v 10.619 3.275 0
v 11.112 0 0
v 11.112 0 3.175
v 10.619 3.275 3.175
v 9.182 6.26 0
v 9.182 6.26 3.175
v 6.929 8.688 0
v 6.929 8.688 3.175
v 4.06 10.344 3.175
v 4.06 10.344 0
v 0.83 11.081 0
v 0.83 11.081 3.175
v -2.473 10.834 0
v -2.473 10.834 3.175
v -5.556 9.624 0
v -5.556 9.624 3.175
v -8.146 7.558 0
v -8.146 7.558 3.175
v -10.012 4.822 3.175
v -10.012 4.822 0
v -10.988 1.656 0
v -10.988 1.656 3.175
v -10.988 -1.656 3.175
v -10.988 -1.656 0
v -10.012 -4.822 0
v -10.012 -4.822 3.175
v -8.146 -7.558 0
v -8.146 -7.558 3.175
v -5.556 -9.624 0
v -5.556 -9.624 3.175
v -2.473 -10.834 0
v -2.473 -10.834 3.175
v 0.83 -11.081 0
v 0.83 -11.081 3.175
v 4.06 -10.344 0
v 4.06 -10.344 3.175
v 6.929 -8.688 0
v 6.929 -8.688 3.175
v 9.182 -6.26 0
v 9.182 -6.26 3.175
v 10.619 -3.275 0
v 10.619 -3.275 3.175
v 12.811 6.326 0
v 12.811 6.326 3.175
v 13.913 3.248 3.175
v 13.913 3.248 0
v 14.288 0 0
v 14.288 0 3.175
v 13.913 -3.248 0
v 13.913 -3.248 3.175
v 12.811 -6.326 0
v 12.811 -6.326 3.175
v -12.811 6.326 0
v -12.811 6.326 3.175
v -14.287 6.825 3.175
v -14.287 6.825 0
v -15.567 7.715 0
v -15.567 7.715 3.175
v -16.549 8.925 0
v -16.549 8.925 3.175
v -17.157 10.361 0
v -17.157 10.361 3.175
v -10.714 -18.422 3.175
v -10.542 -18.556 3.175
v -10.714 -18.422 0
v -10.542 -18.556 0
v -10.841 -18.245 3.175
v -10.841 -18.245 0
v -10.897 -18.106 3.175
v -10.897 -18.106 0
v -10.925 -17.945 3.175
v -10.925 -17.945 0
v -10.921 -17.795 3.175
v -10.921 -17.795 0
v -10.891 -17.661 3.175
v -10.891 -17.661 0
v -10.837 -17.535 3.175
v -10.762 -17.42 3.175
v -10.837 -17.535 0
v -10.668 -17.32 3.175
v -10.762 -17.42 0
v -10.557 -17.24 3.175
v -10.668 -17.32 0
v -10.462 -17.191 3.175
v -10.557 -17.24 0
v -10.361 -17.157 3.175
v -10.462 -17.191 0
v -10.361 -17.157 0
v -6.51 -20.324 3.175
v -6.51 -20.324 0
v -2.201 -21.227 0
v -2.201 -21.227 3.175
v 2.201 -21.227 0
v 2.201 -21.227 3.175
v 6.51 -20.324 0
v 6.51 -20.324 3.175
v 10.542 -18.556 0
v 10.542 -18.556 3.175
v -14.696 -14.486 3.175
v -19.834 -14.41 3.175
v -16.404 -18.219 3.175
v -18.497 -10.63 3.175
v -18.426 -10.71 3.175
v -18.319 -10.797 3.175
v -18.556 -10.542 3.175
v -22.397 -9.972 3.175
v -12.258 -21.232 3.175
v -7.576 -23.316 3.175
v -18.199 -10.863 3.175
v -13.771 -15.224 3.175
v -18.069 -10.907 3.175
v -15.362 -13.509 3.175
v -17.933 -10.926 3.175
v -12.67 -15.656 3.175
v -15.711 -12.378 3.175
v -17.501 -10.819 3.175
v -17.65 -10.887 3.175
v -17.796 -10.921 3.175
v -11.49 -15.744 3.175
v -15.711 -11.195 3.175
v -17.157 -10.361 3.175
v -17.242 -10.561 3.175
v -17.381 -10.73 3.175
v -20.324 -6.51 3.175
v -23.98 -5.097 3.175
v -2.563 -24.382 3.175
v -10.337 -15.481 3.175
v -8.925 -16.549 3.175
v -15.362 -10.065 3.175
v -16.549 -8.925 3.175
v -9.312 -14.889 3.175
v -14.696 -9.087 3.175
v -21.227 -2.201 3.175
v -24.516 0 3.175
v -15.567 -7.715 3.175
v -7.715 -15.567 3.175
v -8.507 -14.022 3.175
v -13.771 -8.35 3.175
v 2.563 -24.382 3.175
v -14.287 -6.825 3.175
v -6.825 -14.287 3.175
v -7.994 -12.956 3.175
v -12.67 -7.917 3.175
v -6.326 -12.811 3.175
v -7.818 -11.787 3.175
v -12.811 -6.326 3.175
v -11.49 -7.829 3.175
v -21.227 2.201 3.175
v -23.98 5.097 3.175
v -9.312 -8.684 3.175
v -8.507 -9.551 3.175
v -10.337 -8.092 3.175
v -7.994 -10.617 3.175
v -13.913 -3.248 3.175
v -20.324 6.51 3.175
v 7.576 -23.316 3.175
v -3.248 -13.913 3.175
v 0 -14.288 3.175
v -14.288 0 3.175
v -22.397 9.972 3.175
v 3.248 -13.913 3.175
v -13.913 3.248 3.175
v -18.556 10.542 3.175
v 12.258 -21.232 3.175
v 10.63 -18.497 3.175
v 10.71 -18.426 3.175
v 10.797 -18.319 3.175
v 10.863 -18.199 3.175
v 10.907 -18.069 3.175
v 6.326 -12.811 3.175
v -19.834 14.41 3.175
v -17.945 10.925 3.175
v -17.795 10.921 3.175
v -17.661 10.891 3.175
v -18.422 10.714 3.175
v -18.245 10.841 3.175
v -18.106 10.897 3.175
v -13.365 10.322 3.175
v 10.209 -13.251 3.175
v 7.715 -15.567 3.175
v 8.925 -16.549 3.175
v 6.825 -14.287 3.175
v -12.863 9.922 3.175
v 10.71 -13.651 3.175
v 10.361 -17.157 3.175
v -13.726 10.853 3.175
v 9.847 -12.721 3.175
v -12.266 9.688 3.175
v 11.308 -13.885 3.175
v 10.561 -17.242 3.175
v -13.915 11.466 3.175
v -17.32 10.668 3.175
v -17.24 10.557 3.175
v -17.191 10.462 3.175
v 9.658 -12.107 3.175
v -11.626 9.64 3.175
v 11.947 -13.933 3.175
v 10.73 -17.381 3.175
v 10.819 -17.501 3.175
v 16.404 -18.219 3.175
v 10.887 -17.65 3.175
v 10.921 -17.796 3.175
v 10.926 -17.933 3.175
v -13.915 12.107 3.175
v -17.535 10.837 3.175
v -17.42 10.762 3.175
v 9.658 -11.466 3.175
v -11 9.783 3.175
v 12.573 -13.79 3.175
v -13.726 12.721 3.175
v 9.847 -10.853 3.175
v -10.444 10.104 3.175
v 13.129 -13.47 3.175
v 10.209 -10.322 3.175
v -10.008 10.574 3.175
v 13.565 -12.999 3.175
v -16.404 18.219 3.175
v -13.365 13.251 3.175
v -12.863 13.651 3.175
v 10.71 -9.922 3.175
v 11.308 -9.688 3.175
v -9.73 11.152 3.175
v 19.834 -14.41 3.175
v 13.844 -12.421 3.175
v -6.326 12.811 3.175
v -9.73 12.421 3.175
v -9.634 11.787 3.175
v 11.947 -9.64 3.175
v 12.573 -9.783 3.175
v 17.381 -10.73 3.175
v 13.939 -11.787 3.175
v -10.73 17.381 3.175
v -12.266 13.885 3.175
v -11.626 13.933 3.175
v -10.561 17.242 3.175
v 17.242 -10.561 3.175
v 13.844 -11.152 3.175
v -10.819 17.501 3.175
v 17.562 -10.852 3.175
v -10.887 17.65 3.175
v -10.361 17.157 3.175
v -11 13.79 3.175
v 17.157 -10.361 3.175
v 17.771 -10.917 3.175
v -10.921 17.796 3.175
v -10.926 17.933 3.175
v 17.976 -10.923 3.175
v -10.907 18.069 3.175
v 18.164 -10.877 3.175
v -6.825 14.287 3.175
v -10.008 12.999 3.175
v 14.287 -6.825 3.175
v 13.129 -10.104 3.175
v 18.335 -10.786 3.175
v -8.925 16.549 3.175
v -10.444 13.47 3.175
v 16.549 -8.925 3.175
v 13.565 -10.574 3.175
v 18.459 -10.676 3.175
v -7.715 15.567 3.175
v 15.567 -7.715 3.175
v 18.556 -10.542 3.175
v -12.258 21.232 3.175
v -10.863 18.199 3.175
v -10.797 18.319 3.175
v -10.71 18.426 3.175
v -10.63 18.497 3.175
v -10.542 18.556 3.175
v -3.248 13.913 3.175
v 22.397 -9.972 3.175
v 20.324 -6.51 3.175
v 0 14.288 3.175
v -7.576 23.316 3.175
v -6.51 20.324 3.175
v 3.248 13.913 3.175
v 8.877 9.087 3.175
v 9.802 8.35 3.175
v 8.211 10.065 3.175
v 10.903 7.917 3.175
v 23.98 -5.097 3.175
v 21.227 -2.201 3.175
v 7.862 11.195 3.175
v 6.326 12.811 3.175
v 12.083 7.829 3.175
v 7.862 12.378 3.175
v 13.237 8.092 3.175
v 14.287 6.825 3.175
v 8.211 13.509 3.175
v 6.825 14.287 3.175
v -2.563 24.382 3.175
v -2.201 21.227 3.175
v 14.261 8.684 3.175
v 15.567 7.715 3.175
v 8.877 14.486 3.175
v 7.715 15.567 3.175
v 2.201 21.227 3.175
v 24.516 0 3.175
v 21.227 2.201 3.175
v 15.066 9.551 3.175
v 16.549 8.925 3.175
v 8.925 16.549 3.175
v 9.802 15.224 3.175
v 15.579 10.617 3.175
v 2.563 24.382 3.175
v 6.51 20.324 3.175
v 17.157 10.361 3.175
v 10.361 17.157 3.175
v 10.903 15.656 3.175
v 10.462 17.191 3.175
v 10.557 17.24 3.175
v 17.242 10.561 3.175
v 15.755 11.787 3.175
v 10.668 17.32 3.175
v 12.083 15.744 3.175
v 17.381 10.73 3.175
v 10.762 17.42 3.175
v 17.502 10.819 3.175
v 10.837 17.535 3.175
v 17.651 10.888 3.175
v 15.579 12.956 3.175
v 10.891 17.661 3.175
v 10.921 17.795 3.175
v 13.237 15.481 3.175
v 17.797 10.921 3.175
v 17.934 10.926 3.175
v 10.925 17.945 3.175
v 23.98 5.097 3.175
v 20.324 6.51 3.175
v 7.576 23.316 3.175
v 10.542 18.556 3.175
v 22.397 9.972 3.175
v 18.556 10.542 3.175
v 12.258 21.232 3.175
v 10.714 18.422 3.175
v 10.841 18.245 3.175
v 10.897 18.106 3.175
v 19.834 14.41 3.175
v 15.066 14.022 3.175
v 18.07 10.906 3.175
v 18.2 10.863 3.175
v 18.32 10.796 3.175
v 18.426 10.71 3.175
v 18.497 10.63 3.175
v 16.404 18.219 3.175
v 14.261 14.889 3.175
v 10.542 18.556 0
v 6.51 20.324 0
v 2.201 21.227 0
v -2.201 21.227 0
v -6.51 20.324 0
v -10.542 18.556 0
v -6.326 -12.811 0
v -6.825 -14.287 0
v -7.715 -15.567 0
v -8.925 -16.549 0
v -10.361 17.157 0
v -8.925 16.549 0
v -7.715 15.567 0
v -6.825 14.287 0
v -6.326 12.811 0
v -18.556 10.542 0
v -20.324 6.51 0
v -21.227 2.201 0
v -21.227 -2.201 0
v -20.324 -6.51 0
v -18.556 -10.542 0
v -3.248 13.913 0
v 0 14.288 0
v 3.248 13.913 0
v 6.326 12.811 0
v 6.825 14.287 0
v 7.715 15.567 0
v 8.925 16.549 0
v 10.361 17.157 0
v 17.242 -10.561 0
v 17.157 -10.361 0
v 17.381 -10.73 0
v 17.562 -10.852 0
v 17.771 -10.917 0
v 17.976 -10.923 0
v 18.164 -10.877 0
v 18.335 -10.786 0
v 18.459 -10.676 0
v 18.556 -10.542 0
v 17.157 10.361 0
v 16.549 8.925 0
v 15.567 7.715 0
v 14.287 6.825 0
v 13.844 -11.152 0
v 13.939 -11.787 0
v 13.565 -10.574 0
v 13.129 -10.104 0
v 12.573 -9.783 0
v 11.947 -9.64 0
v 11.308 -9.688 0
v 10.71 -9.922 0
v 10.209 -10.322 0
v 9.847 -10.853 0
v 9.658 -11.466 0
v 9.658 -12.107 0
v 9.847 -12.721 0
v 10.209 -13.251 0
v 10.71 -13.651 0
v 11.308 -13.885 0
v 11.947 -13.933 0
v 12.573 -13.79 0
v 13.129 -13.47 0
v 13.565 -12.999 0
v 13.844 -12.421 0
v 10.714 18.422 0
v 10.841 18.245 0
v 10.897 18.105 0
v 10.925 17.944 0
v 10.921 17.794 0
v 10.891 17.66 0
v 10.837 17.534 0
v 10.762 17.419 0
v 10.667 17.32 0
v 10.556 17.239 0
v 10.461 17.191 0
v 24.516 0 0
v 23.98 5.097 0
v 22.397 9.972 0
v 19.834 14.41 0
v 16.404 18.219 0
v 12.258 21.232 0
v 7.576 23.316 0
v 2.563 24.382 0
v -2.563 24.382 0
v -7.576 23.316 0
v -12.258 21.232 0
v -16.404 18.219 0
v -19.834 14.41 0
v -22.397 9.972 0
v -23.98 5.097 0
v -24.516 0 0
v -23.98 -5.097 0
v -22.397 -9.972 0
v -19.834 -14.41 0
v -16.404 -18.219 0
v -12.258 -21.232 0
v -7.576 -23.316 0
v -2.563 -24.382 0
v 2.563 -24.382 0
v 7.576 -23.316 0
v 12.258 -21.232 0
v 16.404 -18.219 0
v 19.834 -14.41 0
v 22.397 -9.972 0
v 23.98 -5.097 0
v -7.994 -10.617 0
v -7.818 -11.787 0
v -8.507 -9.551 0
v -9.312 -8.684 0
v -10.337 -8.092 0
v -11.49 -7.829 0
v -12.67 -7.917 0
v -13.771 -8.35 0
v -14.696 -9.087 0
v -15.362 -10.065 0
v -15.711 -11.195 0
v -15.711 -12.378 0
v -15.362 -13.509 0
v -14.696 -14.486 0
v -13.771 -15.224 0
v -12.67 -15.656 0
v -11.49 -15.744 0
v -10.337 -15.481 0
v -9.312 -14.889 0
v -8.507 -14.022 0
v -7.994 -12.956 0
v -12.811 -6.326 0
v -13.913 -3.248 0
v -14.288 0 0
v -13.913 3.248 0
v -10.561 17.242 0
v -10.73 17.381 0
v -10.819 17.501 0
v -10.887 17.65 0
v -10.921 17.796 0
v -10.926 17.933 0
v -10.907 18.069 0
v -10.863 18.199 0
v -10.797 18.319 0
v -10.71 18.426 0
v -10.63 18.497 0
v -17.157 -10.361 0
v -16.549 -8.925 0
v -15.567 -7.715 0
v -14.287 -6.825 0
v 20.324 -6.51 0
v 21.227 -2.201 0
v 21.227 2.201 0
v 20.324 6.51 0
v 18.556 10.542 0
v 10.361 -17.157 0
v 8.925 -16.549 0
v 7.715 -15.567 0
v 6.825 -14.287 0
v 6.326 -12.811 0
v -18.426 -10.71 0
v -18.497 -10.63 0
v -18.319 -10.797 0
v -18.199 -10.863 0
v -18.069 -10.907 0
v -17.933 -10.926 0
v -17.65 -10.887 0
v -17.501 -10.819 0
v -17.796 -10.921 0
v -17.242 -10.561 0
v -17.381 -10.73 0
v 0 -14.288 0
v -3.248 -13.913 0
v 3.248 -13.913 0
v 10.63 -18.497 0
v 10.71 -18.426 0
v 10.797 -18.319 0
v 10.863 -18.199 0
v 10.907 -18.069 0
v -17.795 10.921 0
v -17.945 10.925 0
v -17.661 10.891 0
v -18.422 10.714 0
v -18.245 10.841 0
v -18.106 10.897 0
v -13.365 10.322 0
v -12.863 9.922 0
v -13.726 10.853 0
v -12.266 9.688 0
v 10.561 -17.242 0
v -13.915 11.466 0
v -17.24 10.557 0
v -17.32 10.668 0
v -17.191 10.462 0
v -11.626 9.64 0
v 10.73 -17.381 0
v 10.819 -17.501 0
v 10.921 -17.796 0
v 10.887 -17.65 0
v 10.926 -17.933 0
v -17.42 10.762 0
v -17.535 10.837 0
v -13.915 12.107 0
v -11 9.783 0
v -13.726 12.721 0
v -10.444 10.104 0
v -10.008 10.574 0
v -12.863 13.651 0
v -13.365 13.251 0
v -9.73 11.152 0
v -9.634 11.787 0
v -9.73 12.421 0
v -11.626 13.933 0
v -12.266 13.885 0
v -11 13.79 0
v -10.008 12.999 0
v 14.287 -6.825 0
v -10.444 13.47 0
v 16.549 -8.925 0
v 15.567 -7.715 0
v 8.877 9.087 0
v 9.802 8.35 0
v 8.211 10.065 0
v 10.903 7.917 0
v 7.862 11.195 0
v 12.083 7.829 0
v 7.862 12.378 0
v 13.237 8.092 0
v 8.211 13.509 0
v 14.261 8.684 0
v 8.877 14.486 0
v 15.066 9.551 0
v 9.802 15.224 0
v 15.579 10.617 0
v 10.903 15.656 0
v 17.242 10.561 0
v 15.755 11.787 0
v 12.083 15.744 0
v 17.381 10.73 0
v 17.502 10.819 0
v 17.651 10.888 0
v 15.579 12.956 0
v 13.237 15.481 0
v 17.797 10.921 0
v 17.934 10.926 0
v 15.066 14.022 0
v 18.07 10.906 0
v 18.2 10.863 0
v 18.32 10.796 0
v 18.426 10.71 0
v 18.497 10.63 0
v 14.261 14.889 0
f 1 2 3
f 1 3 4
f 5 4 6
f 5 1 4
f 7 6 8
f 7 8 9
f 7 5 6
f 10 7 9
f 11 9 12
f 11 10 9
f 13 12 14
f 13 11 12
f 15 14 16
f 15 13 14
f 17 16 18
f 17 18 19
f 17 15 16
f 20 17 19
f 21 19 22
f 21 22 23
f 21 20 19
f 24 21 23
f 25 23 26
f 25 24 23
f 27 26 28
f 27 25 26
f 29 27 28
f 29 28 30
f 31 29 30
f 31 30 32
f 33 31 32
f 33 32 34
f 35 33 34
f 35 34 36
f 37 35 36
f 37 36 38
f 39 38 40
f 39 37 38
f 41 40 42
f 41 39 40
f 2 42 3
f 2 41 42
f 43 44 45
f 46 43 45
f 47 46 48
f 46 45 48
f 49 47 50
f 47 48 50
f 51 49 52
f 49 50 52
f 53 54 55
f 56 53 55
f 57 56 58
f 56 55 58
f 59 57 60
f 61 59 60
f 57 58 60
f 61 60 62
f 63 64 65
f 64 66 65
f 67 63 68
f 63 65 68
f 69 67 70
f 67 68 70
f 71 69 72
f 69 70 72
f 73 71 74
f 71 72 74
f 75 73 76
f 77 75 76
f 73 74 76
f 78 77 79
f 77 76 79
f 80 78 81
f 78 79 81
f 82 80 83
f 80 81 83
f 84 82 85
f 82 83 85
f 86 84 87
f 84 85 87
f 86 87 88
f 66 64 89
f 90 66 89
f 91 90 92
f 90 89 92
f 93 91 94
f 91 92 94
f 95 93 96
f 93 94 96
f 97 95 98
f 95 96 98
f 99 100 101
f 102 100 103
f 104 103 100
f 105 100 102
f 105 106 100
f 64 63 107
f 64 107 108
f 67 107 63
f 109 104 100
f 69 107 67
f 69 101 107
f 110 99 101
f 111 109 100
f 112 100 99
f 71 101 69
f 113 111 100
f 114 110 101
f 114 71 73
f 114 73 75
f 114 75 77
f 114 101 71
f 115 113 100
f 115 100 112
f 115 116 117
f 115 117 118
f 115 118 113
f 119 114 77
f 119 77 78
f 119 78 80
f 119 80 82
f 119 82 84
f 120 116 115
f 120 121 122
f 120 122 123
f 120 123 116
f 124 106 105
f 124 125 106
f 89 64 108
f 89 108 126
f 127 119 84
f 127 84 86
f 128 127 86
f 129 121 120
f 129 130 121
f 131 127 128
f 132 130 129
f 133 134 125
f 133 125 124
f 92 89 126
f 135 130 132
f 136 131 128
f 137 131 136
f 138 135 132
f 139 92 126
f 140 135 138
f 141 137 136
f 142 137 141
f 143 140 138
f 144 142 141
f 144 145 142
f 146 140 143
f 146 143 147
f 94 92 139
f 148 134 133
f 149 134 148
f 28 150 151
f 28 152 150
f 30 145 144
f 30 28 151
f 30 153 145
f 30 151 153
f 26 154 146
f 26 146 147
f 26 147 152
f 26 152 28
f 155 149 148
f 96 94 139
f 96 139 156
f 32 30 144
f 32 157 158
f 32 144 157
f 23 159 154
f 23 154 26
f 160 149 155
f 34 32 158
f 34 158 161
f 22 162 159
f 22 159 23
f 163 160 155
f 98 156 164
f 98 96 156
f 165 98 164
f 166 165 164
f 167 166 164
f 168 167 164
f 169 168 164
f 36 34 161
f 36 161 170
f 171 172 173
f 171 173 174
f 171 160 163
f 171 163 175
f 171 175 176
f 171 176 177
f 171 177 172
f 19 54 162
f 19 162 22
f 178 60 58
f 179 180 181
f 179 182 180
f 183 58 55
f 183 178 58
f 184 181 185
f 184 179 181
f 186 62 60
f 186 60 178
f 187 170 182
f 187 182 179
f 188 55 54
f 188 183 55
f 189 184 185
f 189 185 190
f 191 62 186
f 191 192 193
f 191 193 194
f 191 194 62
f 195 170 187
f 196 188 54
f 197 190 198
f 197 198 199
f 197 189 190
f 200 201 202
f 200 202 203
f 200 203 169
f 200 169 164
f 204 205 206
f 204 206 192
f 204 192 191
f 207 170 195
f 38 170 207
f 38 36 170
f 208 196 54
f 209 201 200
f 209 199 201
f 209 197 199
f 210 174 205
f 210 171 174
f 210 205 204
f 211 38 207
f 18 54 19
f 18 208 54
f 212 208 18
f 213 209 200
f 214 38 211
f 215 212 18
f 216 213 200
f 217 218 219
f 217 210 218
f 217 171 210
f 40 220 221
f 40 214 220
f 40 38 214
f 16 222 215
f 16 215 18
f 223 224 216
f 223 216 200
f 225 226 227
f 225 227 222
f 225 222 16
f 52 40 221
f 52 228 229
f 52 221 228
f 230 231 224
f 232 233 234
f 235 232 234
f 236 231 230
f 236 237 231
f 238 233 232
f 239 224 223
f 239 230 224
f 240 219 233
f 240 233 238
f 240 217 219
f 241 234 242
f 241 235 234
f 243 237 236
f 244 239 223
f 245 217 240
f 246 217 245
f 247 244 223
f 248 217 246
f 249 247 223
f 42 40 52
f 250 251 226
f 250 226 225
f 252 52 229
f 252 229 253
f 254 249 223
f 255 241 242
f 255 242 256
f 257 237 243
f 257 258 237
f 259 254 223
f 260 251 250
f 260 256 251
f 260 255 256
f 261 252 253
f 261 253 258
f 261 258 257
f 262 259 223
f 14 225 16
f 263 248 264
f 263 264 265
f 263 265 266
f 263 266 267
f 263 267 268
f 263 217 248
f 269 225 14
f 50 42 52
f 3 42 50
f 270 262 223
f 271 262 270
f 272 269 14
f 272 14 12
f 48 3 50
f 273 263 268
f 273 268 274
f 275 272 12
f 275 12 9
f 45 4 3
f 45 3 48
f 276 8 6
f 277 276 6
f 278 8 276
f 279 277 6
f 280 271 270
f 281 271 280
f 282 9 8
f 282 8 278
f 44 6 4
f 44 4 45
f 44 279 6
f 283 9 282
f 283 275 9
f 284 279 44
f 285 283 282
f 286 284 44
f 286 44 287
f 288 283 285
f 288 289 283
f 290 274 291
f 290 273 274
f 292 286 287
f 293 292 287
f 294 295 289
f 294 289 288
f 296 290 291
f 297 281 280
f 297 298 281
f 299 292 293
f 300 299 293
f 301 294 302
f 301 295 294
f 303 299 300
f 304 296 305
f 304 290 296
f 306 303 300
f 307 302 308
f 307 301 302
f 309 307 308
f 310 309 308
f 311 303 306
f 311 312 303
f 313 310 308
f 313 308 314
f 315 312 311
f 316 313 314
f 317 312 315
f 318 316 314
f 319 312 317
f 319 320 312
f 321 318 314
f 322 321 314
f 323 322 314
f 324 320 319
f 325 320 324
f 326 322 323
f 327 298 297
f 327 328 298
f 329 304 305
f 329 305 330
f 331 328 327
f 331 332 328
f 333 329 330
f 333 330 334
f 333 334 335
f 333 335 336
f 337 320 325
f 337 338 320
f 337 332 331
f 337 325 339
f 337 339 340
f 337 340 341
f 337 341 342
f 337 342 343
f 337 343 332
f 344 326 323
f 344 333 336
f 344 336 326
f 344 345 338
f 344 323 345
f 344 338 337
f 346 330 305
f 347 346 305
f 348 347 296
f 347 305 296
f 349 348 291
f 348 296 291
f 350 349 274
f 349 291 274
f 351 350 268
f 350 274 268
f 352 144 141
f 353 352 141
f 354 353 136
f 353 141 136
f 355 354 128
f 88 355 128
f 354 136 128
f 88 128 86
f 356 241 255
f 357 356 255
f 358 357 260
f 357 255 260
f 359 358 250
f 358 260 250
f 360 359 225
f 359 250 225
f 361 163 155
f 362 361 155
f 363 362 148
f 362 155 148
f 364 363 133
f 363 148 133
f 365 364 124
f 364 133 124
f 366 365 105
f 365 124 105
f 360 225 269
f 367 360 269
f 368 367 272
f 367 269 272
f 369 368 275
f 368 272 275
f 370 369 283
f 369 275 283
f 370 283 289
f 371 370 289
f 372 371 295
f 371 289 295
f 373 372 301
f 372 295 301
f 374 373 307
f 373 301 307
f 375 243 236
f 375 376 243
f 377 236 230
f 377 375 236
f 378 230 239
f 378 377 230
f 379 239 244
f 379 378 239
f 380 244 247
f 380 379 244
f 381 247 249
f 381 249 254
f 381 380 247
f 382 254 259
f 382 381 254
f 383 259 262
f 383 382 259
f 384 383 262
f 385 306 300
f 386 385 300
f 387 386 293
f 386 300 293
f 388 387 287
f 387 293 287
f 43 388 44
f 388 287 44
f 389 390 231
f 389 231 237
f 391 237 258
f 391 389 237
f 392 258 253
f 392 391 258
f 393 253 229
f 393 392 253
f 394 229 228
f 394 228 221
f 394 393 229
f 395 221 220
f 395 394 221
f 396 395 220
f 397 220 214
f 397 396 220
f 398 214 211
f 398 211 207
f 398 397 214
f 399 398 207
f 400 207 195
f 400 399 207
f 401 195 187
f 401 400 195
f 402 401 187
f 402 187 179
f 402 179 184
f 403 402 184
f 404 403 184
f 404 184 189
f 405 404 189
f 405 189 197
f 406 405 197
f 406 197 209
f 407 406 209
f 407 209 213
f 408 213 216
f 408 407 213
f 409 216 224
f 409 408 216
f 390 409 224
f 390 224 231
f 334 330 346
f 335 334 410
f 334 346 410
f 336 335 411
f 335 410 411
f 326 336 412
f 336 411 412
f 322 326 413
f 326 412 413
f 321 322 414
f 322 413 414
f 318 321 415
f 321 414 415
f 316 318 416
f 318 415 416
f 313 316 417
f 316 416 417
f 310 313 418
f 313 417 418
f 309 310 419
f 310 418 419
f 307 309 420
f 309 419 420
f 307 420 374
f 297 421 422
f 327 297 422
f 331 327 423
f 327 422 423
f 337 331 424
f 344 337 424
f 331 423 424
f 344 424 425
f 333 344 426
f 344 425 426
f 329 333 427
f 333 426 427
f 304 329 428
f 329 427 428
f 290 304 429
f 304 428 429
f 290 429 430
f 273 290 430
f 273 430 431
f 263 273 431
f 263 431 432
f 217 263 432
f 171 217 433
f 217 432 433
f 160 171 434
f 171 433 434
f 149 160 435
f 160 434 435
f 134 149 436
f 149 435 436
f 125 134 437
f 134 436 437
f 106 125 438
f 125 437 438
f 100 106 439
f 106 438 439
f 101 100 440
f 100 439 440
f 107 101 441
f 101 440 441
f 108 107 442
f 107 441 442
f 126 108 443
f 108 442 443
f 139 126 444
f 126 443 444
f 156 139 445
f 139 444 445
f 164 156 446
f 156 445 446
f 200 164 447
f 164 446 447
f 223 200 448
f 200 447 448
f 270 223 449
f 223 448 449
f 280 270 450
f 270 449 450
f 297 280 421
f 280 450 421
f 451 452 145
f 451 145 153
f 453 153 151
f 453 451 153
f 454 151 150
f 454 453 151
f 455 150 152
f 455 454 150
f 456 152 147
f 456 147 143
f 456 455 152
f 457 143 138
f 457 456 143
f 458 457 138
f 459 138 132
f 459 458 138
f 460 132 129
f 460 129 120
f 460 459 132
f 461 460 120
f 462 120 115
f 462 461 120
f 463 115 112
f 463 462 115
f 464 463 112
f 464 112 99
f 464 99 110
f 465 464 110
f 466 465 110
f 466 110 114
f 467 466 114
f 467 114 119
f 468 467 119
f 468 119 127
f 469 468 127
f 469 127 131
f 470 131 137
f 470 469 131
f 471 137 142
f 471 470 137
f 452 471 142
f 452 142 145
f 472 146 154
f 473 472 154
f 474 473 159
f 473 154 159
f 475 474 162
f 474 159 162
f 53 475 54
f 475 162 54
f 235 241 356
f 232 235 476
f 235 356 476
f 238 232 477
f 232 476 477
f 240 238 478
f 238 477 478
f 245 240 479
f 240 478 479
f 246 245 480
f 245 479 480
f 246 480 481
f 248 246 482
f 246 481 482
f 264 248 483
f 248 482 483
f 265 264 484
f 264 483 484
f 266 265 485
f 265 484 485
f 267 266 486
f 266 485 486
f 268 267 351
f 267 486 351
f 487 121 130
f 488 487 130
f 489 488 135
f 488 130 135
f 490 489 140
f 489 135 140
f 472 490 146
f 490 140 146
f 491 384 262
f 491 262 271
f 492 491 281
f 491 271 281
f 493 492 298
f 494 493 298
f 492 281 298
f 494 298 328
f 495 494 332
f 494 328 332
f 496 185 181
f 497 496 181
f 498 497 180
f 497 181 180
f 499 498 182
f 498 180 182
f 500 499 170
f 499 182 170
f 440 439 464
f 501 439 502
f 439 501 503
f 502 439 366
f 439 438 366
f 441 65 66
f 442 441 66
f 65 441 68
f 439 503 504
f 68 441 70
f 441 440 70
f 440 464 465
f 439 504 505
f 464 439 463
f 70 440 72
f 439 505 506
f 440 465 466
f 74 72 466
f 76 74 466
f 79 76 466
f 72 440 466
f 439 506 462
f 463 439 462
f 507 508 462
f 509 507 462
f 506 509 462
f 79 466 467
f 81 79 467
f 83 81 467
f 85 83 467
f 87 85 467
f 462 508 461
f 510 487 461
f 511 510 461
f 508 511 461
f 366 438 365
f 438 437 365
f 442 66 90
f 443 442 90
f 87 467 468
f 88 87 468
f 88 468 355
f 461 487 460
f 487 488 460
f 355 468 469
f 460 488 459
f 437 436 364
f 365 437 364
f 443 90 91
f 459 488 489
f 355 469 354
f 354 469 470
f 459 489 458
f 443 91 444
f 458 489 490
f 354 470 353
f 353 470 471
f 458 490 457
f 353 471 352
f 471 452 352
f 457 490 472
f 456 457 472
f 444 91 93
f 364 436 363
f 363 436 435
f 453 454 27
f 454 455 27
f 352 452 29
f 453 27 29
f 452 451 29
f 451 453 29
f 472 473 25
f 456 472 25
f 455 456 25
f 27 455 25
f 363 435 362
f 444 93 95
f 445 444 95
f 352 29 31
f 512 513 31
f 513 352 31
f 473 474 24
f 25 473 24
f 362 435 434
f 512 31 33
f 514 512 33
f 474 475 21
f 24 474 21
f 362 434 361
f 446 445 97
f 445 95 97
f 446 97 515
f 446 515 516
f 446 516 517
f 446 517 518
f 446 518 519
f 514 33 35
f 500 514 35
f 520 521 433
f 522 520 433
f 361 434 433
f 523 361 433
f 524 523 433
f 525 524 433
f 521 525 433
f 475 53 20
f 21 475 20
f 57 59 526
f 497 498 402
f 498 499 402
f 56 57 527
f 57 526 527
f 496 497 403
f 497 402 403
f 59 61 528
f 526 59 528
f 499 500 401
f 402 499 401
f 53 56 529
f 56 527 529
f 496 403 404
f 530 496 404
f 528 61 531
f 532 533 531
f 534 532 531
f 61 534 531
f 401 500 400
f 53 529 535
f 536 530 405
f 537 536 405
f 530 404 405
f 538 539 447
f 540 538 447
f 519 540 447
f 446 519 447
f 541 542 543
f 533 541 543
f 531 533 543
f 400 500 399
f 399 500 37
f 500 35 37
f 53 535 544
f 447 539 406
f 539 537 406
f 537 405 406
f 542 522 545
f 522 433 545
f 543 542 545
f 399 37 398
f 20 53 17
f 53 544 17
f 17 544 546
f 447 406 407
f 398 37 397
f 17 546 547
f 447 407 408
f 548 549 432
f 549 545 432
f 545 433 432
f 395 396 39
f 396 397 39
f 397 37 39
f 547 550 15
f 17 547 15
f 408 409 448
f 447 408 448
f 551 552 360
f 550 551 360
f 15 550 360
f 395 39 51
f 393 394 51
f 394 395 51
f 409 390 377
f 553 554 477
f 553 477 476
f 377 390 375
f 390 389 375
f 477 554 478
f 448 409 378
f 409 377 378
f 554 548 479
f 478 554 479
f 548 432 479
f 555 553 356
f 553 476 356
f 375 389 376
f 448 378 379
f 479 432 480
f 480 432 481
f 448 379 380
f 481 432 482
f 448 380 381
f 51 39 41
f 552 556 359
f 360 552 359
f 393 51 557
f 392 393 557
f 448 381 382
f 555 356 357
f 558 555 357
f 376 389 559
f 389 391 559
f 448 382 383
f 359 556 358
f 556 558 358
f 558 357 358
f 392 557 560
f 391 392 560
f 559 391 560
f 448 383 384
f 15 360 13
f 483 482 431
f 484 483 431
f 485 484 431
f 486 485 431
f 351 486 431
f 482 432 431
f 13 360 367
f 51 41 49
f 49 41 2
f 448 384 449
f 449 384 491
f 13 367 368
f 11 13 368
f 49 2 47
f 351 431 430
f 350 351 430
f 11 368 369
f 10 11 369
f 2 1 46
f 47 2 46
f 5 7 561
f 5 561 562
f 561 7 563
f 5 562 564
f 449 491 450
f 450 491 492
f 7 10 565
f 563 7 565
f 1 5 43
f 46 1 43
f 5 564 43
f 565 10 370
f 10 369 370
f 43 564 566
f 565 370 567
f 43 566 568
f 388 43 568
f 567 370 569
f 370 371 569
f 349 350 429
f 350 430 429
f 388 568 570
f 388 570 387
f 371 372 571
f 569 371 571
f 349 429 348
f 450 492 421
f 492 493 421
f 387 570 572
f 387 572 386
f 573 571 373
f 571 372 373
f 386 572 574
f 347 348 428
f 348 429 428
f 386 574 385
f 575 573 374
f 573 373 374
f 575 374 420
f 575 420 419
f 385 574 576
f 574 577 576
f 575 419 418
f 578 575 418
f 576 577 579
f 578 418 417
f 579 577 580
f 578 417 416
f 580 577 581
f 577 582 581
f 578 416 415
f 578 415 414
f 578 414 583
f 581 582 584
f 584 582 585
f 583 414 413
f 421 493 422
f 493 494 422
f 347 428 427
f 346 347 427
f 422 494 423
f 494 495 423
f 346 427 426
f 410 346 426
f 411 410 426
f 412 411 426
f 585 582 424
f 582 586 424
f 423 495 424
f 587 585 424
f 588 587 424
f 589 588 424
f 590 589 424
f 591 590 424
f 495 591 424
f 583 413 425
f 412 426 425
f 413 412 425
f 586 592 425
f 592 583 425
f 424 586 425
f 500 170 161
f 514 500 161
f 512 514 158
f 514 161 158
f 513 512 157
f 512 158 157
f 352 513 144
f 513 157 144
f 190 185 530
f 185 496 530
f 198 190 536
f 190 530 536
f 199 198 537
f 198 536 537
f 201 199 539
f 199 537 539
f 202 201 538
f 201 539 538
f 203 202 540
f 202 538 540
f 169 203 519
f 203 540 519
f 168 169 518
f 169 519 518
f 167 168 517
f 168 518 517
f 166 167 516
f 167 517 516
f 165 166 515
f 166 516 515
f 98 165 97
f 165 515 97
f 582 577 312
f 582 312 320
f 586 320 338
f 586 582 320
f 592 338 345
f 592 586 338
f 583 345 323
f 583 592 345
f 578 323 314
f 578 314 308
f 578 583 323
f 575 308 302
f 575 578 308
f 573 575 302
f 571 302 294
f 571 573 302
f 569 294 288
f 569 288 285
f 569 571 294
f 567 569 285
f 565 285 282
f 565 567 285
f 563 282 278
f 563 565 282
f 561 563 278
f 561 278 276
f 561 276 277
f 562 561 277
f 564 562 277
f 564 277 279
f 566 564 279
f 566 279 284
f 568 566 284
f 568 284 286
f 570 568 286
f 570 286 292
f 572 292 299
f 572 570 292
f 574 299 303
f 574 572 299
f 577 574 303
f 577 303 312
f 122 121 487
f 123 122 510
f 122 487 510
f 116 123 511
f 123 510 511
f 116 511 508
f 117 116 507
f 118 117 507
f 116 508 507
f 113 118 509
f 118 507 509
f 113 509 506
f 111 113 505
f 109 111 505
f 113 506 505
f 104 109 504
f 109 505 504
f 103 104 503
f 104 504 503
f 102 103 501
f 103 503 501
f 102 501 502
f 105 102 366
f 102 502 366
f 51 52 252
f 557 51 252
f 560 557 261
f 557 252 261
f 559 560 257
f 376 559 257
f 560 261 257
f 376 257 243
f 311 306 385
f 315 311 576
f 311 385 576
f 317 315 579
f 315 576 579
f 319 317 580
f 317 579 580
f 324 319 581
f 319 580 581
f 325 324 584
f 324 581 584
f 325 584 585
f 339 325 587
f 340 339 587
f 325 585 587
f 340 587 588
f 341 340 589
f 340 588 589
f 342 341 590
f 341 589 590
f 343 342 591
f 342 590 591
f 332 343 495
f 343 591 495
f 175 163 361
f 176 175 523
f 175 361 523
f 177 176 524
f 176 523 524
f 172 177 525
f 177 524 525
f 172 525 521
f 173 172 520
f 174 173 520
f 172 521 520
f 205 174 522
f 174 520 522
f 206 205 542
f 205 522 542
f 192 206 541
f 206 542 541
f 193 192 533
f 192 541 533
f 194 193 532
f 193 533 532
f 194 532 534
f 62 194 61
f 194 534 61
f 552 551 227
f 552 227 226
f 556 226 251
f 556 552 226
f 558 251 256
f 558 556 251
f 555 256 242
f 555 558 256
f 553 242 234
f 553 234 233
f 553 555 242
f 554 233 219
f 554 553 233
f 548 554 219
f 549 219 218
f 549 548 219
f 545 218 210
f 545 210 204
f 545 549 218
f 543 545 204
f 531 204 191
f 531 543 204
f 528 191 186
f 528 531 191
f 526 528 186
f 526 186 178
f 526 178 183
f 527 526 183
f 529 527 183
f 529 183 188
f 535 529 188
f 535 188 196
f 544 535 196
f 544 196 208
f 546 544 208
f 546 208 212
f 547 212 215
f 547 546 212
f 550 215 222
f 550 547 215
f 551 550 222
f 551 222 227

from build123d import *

# Parameters (mm, degrees)
F0_R            = 24.51608
F0_R_2          = 3.96875
F0_R_3          = 2.15265
F0_R_4          = 11.1125
F1_DEPTH        = 3.175
F3_DEPTH        = 3.175
F3_COPIES_COUNT = 4
F4_R            = 0.762


# Not quite as in the source:
# - a pattern or mirror of a feature is missing from the dataset's text; its kind, count and spacing are read off the source's solid


with BuildPart() as f1:
    # F0 (on Top) → F1 (new body)
    with BuildSketch(Plane.XY):
        Circle(F0_R)
        with Locations((-11.7865861589, -11.7865861589)):
            Circle(F0_R_2, mode=Mode.SUBTRACT)
        with Locations((11.7865861589, -11.7865861589)):
            Circle(F0_R_3, mode=Mode.SUBTRACT)
        with Locations((-11.7865861589, 11.7865861589)):
            Circle(F0_R_3, mode=Mode.SUBTRACT)
        Circle(F0_R_4, mode=Mode.SUBTRACT)
        with Locations((11.7865861589, 11.7865861589)):
            Circle(F0_R_2, mode=Mode.SUBTRACT)
    extrude(amount=F1_DEPTH)

    # F2 (on face) → F3 (cut, through all)
    with BuildSketch(Plane.XY.offset(3.175)):
        with BuildLine():
            ThreePointArc((-12.5005283394, 17.296776775), (-8.5209489043, 16.2818645023), (-6.3255746232, 12.8109235396))
            ThreePointArc((-6.3255746232, 12.8109235396), (0, 14.2875), (6.3255746232, 12.8109235396))
            ThreePointArc((6.3255746232, 12.8109235396), (8.5209489043, 16.2818645023), (12.5005283394, 17.296776775))
            ThreePointArc((12.5005283394, 17.296776775), (0, 21.34108), (-12.5005283394, 17.296776775))
        make_face()
    f3 = extrude(amount=-F3_DEPTH, mode=Mode.SUBTRACT)

    # F3_copies: F3 ×4 about axis
    f3_copies_axis = Axis((0, 0, 0), (0, 0, 1))
    for i in range(1, F3_COPIES_COUNT):
        add(f3.rotate(f3_copies_axis, i * 360 / F3_COPIES_COUNT), mode=Mode.SUBTRACT)

    # F4
    f4_edges = [f1.edges().sort_by_distance(p)[0] for p in [
        (-12.500528, 17.296777, 1.5875),
        (12.500528, 17.296777, 1.5875),
        (12.500528, -17.296777, 1.5875),
        (-12.500528, -17.296777, 1.5875),
        (17.296777, 12.500528, 1.5875),
        (17.296777, -12.500528, 1.5875),
        (-17.296777, -12.500528, 1.5875),
        (-17.296777, 12.500528, 1.5875),
    ]]
    fillet(f4_edges, radius=F4_R)


solid = f1.part
